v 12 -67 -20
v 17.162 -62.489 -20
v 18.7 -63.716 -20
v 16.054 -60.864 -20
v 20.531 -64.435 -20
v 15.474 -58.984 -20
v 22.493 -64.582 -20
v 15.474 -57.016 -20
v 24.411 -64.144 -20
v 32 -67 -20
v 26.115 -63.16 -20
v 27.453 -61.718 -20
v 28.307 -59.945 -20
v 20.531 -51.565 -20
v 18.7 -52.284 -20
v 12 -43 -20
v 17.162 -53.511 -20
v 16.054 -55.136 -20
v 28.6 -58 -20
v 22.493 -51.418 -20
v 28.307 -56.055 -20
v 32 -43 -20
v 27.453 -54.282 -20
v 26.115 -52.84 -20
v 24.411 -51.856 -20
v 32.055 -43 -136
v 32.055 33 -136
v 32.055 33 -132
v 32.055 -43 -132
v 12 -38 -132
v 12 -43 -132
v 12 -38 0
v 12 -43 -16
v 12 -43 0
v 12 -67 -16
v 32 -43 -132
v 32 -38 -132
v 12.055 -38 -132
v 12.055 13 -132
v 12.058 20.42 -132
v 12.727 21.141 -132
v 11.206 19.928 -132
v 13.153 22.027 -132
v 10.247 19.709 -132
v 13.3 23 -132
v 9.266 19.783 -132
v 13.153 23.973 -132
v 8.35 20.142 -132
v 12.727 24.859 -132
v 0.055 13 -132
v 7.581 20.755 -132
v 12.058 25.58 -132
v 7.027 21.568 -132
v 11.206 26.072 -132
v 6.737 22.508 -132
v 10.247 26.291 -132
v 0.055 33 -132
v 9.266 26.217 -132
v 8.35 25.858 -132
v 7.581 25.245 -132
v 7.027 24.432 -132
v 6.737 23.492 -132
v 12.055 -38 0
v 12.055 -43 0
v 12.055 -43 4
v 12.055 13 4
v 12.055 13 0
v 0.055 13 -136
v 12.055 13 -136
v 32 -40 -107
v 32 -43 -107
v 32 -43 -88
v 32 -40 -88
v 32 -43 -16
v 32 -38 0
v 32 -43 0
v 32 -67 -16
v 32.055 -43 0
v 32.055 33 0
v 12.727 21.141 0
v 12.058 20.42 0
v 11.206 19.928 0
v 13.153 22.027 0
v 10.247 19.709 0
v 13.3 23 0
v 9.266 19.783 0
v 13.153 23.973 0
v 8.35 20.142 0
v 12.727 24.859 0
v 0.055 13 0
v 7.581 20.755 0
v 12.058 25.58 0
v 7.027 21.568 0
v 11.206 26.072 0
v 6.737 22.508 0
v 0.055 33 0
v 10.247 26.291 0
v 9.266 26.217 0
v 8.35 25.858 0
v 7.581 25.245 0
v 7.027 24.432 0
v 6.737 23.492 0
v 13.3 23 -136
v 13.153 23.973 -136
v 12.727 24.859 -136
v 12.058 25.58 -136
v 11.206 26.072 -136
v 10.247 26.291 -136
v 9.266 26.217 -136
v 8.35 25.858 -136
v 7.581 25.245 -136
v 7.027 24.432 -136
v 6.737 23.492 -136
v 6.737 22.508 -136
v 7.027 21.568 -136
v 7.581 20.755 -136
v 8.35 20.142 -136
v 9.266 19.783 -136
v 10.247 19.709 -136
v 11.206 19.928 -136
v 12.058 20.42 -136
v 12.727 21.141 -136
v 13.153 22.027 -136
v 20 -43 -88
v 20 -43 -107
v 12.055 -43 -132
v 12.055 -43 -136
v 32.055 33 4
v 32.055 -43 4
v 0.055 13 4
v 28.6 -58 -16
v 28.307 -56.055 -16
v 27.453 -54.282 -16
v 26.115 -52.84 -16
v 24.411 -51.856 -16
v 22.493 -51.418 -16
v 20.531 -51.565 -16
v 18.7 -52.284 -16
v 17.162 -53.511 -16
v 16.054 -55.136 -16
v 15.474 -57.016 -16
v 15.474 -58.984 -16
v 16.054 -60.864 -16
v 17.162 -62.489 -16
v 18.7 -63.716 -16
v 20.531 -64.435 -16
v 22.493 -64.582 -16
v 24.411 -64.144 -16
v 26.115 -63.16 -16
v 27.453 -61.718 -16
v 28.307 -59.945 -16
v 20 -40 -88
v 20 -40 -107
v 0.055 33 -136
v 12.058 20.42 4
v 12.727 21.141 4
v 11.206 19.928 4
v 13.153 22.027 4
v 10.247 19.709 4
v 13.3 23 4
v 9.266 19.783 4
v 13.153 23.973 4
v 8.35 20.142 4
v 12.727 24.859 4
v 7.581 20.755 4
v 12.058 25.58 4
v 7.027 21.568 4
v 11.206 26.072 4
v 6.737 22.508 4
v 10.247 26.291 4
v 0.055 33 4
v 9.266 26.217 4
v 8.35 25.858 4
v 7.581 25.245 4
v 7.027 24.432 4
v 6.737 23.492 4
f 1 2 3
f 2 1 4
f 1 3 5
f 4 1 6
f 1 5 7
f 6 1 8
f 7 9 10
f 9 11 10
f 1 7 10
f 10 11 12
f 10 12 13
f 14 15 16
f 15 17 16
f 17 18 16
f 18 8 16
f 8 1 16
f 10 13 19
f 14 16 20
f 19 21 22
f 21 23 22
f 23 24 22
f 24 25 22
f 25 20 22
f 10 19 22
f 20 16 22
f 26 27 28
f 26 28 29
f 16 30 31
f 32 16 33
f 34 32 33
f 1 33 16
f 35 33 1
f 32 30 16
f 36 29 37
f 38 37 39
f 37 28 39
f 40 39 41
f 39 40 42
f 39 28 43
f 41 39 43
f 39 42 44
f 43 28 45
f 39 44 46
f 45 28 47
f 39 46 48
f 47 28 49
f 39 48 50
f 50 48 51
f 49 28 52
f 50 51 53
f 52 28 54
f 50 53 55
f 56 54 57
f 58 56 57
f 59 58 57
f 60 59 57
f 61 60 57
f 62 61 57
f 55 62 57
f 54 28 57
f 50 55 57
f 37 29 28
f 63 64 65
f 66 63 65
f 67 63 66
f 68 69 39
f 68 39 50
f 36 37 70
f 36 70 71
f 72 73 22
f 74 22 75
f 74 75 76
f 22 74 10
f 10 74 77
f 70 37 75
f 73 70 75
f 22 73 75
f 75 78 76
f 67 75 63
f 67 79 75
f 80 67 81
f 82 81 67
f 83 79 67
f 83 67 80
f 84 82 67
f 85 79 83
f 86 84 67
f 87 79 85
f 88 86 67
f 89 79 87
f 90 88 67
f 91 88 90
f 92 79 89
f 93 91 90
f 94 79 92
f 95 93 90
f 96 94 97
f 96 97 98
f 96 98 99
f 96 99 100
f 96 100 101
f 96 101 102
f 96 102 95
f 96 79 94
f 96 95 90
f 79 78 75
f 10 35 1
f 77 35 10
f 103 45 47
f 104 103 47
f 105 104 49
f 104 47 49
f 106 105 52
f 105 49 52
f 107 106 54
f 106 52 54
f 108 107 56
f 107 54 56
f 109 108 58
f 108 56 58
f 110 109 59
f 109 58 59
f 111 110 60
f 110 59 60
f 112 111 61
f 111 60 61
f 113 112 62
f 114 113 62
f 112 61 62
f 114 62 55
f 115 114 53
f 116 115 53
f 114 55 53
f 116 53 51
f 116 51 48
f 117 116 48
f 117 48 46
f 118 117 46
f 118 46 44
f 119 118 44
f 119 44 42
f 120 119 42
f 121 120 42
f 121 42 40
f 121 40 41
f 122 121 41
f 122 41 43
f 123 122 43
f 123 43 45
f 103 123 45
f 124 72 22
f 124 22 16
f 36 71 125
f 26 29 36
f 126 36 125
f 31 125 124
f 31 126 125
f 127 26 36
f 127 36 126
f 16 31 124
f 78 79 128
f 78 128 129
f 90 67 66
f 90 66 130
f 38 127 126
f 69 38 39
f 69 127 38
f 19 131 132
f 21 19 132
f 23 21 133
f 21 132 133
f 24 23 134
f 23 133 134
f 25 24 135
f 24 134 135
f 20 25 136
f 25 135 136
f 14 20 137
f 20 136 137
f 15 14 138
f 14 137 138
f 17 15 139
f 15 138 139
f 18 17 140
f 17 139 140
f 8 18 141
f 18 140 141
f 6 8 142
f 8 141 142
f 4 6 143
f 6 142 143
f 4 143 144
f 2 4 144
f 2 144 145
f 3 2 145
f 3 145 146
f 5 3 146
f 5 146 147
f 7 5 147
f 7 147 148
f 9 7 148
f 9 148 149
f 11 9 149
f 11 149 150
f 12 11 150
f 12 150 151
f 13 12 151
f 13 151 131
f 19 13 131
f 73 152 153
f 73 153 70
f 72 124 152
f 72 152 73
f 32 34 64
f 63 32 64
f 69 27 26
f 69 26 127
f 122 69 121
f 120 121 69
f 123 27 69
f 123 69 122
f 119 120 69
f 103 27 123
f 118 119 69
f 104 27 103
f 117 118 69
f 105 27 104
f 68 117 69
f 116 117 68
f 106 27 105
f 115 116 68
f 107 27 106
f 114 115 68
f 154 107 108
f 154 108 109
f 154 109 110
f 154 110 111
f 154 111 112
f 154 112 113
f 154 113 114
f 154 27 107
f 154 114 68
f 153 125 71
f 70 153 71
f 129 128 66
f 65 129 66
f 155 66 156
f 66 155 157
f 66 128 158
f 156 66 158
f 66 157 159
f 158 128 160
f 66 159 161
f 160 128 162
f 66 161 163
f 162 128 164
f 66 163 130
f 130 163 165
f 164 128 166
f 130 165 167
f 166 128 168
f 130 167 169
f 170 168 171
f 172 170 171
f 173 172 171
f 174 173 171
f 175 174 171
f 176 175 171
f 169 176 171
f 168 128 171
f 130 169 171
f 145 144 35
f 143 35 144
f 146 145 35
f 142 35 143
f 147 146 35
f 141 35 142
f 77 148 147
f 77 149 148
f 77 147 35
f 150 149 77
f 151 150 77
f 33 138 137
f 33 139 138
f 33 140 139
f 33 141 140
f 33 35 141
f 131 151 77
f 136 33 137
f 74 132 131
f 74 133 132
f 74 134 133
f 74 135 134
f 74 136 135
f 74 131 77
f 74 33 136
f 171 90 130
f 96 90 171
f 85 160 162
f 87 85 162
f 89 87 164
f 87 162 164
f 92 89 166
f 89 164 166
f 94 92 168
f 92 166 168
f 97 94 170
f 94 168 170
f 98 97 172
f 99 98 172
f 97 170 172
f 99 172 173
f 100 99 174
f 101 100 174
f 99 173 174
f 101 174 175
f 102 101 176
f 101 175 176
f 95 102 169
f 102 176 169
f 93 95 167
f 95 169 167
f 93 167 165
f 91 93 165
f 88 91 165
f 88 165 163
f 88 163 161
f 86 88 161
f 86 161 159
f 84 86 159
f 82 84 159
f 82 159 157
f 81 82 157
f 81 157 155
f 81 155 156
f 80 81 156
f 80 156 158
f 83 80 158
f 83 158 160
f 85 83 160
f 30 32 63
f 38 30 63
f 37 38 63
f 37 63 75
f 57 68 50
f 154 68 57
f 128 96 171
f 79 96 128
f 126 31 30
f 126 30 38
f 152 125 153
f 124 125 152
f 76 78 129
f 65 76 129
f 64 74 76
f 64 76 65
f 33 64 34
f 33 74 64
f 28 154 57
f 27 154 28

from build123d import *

# Parameters (mm, degrees)
SKETCH010_W   = 12
SKETCH010_H   = 19
PAD004_DEPTH  = 3
SKETCH003_W   = 20
SKETCH003_H   = 5
PAD001_DEPTH  = 132
PAD002_DEPTH  = 4
SKETCH005_R   = 3.3
HOLE001_DEPTH = 4.001
SKETCH006_W   = 20
SKETCH006_H   = 4
PAD003_DEPTH  = 24
SKETCH009_R   = 6.6
HOLE002_DEPTH = 4.001
PAD_DEPTH     = 4
SKETCH002_R   = 3.3
HOLE_DEPTH    = 4.001


with BuildPart() as body004:
    # Sketch010 (on Face1 of CopyPad001001) → Pad004 (new body)
    with BuildSketch(Plane.XZ.offset(43)):
        with Locations((26, -97.5)):
            Rectangle(SKETCH010_W, SKETCH010_H)
    extrude(amount=-PAD004_DEPTH)


with BuildPart() as body001:
    # Sketch003 (on Face1 of CopyHole) → Pad001 (new body)
    with BuildSketch(Plane(origin=(0, 0, 0), x_dir=(1, 0, 0), z_dir=(0, 0, -1))):
        with Locations((22, 40.5)):
            Rectangle(SKETCH003_W, SKETCH003_H)
    extrude(amount=PAD001_DEPTH)

    # Boolean: cut Body004
    add(body004.part, mode=Mode.SUBTRACT)


with BuildPart() as body002:
    # Sketch004 → Pad002 (new body)
    with BuildSketch(Plane.XY):
        Polygon((0.055073, 33), (32.055073, 33), (32.055073, -43), (12.055073, -43), (12.055073, 13), (0.055073, 13), align=None)
    extrude(amount=PAD002_DEPTH)

    # Sketch005 (on Face8 of Pad002) → Hole001 (cut, through all)
    with BuildSketch(Plane.XY.offset(4)):
        with Locations((10, 23)):
            Circle(SKETCH005_R)
    extrude(amount=-HOLE001_DEPTH, mode=Mode.SUBTRACT)


with BuildPart() as body002_1:
    # Body002 placement: moved
    add(body002.part.moved(Location((0, 0, -136))))


with BuildPart() as body003:
    # Sketch006 (on Face1 of CopyPad001) → Pad003 (new body)
    with BuildSketch(Plane.XZ.offset(43)):
        with Locations((22, -18)):
            Rectangle(SKETCH006_W, SKETCH006_H)
    extrude(amount=PAD003_DEPTH)

    # Sketch009 (on Face1 of Pad003) → Hole002 (cut, through all)
    with BuildSketch(Plane.XY.offset(-16)):
        with Locations((22, -58)):
            Circle(SKETCH009_R)
    extrude(amount=-HOLE002_DEPTH, mode=Mode.SUBTRACT)


with BuildPart() as body:
    # Sketch → Pad (new body)
    with BuildSketch(Plane.XY):
        Polygon((0.055073, 33), (32.055073, 33), (32.055073, -43), (12.055073, -43), (12.055073, 13), (0.055073, 13), align=None)
    extrude(amount=PAD_DEPTH)

    # Sketch002 (on Face8 of Pad) → Hole (cut, through all)
    with BuildSketch(Plane.XY.offset(4)):
        with Locations((10, 23)):
            Circle(SKETCH002_R)
    extrude(amount=-HOLE_DEPTH, mode=Mode.SUBTRACT)

    # Boolean001: union Body001
    add(body001.part)

    # Boolean002: union Body002
    add(body002_1.part)

    # Boolean003: union Body003
    add(body003.part)


solid = body.part
